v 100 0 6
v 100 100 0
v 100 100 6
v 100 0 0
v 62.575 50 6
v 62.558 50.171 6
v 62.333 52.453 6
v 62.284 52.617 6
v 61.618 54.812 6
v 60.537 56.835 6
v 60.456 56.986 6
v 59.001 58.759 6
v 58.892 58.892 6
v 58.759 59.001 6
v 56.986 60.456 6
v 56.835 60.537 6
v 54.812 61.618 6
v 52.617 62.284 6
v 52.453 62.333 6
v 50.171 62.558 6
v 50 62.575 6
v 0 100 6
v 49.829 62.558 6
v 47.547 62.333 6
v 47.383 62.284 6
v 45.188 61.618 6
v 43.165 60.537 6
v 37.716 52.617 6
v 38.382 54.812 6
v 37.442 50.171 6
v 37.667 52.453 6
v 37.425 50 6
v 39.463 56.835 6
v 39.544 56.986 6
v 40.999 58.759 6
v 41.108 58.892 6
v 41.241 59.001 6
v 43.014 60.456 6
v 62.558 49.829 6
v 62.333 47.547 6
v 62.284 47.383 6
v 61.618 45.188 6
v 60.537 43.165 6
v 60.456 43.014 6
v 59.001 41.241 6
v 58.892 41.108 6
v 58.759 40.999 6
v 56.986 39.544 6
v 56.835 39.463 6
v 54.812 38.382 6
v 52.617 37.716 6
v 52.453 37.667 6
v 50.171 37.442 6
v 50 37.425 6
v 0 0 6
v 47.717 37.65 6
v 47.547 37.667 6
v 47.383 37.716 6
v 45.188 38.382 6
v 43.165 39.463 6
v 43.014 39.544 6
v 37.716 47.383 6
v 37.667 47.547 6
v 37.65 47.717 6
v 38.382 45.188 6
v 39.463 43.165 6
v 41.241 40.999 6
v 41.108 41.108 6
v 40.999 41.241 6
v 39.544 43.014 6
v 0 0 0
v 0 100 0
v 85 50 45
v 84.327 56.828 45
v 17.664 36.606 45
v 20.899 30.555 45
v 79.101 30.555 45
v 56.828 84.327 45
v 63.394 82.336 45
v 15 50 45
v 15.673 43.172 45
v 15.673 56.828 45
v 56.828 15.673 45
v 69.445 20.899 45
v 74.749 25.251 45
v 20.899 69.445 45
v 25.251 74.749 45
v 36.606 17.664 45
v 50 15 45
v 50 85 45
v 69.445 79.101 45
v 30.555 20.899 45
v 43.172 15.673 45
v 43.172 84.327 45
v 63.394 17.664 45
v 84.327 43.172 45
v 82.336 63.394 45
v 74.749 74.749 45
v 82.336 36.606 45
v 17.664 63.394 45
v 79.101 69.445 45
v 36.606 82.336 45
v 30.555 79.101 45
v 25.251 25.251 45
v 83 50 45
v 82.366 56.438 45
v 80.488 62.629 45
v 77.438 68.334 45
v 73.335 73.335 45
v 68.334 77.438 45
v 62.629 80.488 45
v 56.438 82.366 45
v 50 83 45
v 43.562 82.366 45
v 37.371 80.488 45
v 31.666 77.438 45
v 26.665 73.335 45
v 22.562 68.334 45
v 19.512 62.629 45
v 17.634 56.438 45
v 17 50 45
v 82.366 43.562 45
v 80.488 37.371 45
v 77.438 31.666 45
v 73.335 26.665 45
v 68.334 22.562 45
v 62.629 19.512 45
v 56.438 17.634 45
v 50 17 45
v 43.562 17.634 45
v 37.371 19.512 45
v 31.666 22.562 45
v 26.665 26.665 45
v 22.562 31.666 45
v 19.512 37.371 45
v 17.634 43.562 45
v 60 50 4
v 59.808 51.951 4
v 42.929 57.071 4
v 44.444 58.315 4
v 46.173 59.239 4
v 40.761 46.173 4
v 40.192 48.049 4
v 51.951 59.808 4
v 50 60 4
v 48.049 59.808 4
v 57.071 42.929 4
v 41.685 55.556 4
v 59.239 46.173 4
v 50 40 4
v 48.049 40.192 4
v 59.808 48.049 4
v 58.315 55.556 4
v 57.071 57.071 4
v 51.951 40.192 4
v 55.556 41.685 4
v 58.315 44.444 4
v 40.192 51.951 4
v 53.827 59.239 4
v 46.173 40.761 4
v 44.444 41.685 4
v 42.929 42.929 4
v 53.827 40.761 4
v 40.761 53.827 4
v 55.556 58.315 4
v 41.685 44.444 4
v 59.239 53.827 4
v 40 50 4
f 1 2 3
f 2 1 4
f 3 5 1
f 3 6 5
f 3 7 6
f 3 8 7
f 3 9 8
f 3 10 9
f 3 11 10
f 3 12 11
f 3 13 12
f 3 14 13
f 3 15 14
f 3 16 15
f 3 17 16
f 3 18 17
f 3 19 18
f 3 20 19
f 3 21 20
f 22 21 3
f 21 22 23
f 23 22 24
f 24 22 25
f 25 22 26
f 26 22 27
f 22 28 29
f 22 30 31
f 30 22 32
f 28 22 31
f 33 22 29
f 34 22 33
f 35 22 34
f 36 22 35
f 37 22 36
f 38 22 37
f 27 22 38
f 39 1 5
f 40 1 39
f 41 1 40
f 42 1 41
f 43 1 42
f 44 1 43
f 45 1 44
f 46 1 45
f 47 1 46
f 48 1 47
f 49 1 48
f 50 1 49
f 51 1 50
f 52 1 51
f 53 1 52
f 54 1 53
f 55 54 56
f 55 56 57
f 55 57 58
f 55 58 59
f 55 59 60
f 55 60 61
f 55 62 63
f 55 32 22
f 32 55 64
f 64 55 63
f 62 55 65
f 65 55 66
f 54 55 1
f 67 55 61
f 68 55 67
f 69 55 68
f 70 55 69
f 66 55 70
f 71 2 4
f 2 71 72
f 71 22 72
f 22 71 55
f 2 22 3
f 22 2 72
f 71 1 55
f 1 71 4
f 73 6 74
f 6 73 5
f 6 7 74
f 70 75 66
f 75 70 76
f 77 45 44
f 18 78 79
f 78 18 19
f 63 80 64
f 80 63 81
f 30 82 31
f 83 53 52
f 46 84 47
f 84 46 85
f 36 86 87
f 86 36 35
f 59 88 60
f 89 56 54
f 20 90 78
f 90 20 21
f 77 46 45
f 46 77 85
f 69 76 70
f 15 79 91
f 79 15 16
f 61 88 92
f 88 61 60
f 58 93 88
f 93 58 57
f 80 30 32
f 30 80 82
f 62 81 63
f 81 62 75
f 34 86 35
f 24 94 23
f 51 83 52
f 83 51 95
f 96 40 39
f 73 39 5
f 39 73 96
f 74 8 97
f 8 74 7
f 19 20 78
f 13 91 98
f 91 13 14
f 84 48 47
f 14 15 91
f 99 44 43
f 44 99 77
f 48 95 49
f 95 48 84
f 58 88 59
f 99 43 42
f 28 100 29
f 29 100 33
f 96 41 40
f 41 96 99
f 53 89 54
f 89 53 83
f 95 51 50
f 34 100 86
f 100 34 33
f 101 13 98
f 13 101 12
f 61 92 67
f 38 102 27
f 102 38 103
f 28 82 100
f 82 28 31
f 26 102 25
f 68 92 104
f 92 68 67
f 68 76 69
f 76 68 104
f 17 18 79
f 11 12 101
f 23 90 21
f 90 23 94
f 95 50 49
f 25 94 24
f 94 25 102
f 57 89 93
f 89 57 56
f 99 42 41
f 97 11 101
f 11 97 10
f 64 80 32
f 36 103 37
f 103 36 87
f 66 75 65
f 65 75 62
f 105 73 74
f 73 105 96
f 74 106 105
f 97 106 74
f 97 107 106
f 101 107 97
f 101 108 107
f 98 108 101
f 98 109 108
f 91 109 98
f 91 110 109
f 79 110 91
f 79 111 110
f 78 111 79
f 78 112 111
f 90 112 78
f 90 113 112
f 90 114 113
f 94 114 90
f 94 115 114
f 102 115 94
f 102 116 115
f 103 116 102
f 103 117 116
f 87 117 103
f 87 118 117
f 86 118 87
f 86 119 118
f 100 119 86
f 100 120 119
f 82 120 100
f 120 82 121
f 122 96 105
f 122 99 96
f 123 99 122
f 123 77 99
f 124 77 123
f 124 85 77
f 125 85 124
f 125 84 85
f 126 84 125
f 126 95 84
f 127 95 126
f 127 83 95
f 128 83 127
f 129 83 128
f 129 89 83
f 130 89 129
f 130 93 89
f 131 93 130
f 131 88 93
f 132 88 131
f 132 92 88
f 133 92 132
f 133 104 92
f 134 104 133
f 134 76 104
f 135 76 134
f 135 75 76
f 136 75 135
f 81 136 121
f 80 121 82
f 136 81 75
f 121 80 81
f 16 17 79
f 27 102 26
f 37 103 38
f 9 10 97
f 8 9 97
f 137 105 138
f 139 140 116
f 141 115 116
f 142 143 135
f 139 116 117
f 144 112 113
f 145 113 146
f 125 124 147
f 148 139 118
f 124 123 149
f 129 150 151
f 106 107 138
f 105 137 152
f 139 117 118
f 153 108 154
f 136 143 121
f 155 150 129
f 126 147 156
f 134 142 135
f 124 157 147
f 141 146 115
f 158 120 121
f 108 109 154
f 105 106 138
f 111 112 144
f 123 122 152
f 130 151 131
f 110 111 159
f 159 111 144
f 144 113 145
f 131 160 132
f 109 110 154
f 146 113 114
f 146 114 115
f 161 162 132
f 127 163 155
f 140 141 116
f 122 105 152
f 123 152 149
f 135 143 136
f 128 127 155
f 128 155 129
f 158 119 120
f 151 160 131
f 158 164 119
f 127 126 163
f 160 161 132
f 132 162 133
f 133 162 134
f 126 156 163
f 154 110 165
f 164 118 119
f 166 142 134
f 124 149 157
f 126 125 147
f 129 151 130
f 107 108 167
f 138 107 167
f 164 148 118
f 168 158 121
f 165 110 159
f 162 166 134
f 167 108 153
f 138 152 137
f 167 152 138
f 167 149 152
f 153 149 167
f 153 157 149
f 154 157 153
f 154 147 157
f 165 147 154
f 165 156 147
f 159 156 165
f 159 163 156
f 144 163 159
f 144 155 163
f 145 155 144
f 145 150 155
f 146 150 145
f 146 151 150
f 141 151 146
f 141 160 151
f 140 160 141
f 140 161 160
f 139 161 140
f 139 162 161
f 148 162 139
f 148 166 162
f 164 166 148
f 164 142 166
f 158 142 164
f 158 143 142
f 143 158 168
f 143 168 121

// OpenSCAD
$fn = 32;

// ----------------------------------------------------------------------
// Hopper: funnel with square flange
// ----------------------------------------------------------------------

// --- parameters (mm) ---
fl = 100;                 // flange side, X and Y
fl_t = 6;                 // flange thickness
cone_h = 40;              // cone height above the flange
top_d = 70;               // cone mouth diameter
bot_d = 24;               // cone spout diameter
wall = 2;                 // cone wall thickness

bore_d = bot_d - 2 * wall;  // spout bore diameter
total_h = fl_t + cone_h - 1;  // overall height

difference() {
  union() {
    cube([fl, fl, fl_t]);
    translate([fl / 2, fl / 2, fl_t - 1])
      cylinder(h = cone_h, d1 = bot_d, d2 = top_d);
  }
  translate([fl / 2, fl / 2, fl_t - 2])
    cylinder(h = cone_h + 1, d1 = bore_d, d2 = top_d - 2 * wall);
}
